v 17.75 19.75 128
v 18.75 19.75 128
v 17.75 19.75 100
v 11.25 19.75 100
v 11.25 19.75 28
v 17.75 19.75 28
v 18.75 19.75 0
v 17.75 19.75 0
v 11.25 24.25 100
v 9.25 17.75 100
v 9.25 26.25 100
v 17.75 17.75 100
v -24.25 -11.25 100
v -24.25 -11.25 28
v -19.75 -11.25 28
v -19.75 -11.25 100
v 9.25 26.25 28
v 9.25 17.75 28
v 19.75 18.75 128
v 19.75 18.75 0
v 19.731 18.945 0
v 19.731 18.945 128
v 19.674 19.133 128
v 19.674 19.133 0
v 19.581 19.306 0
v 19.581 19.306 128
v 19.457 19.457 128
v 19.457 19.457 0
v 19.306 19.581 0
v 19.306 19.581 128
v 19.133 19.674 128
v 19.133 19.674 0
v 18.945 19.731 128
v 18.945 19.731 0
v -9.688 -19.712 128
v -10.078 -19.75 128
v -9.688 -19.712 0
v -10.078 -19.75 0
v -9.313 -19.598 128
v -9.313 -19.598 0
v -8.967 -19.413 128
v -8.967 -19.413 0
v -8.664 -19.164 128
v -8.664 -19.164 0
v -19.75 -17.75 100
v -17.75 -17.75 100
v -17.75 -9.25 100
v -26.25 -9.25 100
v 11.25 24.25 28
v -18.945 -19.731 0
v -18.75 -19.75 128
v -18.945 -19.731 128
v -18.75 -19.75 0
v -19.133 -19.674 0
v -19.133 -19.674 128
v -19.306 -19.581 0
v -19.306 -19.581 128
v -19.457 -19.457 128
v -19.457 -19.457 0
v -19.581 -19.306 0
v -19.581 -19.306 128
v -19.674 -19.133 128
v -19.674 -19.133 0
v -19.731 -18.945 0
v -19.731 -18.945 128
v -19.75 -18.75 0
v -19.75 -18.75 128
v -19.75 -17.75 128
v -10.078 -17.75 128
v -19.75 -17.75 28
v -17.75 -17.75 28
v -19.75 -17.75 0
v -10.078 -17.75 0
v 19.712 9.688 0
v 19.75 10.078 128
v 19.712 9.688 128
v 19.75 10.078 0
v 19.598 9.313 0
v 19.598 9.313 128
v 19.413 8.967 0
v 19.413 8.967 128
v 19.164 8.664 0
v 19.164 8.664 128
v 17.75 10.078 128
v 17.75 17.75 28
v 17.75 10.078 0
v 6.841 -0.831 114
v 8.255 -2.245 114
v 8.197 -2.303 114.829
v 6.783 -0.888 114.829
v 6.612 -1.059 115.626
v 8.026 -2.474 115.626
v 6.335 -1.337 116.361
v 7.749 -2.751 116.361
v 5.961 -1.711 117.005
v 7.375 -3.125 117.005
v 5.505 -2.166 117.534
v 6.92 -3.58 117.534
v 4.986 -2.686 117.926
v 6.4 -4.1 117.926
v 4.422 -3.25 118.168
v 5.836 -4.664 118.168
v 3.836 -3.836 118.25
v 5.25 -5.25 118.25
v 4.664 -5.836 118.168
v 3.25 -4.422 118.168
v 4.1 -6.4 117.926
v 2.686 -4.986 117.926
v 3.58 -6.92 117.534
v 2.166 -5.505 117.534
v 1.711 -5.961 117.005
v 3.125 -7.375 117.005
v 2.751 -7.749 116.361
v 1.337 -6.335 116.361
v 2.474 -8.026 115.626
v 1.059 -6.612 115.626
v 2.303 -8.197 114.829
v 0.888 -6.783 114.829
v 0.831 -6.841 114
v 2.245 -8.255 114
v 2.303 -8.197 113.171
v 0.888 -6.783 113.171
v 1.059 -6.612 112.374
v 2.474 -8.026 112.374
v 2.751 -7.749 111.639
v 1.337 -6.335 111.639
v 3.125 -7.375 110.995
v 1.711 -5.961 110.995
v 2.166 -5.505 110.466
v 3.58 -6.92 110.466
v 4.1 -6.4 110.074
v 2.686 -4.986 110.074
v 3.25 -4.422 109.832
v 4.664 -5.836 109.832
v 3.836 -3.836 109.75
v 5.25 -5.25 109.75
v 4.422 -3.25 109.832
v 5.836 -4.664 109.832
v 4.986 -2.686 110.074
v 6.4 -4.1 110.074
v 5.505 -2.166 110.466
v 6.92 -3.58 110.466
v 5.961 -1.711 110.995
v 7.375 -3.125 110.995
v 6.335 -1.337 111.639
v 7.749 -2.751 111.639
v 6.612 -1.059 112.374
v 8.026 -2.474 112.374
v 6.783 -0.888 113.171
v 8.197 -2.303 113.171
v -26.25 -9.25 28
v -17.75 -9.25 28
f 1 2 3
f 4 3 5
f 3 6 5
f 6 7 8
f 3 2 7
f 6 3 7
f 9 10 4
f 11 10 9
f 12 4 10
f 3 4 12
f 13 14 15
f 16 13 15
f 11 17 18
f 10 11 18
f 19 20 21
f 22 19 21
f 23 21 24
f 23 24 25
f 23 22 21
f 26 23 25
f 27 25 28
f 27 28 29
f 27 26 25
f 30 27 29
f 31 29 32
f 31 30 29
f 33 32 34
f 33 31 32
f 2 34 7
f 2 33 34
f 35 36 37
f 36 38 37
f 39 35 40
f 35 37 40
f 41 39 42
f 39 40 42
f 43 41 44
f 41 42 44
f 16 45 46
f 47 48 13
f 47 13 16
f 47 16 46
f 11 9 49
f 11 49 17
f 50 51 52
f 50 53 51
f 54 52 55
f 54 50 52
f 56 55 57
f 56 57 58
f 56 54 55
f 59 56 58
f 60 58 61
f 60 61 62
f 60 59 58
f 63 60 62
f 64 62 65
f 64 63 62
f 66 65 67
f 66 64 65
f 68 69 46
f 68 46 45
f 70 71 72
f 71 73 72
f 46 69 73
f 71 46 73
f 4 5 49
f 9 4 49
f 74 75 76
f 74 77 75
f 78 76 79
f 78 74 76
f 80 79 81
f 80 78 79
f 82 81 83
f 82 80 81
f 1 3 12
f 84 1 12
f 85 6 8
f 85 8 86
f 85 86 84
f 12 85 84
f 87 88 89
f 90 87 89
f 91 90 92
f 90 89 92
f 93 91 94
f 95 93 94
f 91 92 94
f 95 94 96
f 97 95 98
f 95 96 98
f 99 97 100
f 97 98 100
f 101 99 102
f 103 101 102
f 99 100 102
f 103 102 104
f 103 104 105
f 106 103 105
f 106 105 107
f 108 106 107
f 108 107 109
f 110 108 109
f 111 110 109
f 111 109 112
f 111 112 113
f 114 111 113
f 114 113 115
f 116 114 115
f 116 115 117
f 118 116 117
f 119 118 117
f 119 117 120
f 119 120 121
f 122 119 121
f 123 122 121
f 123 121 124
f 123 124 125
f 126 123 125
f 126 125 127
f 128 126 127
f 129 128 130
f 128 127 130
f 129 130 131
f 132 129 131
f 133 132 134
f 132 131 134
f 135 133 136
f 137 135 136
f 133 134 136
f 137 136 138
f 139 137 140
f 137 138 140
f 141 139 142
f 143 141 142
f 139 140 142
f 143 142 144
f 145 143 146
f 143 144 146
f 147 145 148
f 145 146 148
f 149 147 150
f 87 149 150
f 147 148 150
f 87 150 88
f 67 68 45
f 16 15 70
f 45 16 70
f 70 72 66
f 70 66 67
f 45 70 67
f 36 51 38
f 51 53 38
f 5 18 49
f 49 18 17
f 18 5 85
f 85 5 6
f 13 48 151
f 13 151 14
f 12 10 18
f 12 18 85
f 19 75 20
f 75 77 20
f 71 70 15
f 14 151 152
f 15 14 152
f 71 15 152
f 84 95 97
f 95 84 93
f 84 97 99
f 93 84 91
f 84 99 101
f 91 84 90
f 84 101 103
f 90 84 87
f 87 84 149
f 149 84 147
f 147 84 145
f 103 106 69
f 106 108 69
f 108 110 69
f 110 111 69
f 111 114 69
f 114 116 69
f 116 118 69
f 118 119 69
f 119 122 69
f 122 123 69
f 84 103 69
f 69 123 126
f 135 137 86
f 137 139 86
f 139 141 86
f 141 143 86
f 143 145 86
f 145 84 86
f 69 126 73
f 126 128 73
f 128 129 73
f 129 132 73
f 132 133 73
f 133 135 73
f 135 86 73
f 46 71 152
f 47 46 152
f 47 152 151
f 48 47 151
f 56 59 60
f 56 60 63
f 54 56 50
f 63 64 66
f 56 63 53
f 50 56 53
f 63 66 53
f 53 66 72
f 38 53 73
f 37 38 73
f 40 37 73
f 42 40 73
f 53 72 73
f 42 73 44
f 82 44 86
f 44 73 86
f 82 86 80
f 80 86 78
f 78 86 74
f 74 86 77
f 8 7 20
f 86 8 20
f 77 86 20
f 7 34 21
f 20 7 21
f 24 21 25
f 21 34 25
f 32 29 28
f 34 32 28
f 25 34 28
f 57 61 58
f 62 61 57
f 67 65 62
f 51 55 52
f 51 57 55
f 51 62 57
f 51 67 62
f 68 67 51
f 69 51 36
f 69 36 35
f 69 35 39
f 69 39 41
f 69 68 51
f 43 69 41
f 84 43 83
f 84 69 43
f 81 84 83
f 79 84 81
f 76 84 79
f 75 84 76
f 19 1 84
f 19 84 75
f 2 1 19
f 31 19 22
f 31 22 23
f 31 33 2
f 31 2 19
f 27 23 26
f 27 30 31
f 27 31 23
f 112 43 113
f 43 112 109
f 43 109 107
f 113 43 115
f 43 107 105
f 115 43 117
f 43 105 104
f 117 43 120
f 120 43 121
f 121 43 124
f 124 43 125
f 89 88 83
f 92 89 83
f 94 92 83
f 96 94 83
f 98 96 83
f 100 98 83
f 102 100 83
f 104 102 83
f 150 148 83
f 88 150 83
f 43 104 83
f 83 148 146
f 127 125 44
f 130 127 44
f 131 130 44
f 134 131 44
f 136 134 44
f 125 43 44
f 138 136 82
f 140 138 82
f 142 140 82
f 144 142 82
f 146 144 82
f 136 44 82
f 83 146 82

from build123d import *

# Parameters (mm, degrees)
F1_DEPTH = 28
F3_DEPTH = 72
F5_DEPTH = 28
F6_R     = 2
F7_R     = 1
F8_R     = 4.25
F9_DEPTH = 25


with BuildPart() as f1:
    # F0 (on Top) → F1 (new body)
    with BuildSketch(Plane.XY):
        Polygon((-19.75, -17.750001), (-19.75, -19.75), (-9.25, -19.75), (19.75, 9.25), (19.75, 19.75), (17.750001, 19.75), (17.750001, 10.078427), (-10.078427, -17.750001), align=None)
    extrude(amount=F1_DEPTH)

    # F2 (on face) → F3 (join)
    with BuildSketch(Plane.XY.offset(28)):
        Polygon((-19.75, -19.75), (-9.25, -19.75), (19.75, 9.25), (19.75, 19.75), (11.25, 19.75), (11.25, 24.25), (9.25, 26.25), (9.25, 23.421573), (9.25, 19.75), (9.25, 17.750001), (17.750001, 17.750001), (17.750001, 10.078427), (16.585787, 8.914213), (-8.914213, -16.585787), (-10.078427, -17.750001), (-17.750001, -17.750001), (-17.750001, -9.25), (-19.75, -9.25), (-23.421573, -9.25), (-26.25, -9.25), (-24.25, -11.25), (-19.75, -11.25), align=None)
    extrude(amount=F3_DEPTH)

    # F4 (on face) → F5 (join)
    with BuildSketch(Plane.XY.offset(100)):
        Polygon((19.75, 9.25), (19.75, 19.75), (17.750001, 19.75), (17.750001, 10.078427), (-10.078427, -17.750001), (-19.75, -17.750001), (-19.75, -19.75), (-9.25, -19.75), align=None)
    extrude(amount=F5_DEPTH)

    # F6
    f6_edges = [f1.edges().sort_by_distance(p)[0] for p in [
        (19.75, 9.25, 64),
        (-9.25, -19.75, 64),
    ]]
    fillet(f6_edges, radius=F6_R)

    # F7
    f7_edges = [f1.edges().sort_by_distance(p)[0] for p in [
        (-19.75, -19.75, 64),
        (19.75, 19.75, 64),
    ]]
    fillet(f7_edges, radius=F7_R)

    # F8 (on face) → F9 (cut)
    with BuildSketch(Plane(origin=(5.25, -5.25, 0), x_dir=(0.707107, 0.707107, 0), z_dir=(0.707107, -0.707107, 0))):
        with Locations((0, 114)):
            Circle(F8_R)
    extrude(amount=-F9_DEPTH, mode=Mode.SUBTRACT)


solid = f1.part
